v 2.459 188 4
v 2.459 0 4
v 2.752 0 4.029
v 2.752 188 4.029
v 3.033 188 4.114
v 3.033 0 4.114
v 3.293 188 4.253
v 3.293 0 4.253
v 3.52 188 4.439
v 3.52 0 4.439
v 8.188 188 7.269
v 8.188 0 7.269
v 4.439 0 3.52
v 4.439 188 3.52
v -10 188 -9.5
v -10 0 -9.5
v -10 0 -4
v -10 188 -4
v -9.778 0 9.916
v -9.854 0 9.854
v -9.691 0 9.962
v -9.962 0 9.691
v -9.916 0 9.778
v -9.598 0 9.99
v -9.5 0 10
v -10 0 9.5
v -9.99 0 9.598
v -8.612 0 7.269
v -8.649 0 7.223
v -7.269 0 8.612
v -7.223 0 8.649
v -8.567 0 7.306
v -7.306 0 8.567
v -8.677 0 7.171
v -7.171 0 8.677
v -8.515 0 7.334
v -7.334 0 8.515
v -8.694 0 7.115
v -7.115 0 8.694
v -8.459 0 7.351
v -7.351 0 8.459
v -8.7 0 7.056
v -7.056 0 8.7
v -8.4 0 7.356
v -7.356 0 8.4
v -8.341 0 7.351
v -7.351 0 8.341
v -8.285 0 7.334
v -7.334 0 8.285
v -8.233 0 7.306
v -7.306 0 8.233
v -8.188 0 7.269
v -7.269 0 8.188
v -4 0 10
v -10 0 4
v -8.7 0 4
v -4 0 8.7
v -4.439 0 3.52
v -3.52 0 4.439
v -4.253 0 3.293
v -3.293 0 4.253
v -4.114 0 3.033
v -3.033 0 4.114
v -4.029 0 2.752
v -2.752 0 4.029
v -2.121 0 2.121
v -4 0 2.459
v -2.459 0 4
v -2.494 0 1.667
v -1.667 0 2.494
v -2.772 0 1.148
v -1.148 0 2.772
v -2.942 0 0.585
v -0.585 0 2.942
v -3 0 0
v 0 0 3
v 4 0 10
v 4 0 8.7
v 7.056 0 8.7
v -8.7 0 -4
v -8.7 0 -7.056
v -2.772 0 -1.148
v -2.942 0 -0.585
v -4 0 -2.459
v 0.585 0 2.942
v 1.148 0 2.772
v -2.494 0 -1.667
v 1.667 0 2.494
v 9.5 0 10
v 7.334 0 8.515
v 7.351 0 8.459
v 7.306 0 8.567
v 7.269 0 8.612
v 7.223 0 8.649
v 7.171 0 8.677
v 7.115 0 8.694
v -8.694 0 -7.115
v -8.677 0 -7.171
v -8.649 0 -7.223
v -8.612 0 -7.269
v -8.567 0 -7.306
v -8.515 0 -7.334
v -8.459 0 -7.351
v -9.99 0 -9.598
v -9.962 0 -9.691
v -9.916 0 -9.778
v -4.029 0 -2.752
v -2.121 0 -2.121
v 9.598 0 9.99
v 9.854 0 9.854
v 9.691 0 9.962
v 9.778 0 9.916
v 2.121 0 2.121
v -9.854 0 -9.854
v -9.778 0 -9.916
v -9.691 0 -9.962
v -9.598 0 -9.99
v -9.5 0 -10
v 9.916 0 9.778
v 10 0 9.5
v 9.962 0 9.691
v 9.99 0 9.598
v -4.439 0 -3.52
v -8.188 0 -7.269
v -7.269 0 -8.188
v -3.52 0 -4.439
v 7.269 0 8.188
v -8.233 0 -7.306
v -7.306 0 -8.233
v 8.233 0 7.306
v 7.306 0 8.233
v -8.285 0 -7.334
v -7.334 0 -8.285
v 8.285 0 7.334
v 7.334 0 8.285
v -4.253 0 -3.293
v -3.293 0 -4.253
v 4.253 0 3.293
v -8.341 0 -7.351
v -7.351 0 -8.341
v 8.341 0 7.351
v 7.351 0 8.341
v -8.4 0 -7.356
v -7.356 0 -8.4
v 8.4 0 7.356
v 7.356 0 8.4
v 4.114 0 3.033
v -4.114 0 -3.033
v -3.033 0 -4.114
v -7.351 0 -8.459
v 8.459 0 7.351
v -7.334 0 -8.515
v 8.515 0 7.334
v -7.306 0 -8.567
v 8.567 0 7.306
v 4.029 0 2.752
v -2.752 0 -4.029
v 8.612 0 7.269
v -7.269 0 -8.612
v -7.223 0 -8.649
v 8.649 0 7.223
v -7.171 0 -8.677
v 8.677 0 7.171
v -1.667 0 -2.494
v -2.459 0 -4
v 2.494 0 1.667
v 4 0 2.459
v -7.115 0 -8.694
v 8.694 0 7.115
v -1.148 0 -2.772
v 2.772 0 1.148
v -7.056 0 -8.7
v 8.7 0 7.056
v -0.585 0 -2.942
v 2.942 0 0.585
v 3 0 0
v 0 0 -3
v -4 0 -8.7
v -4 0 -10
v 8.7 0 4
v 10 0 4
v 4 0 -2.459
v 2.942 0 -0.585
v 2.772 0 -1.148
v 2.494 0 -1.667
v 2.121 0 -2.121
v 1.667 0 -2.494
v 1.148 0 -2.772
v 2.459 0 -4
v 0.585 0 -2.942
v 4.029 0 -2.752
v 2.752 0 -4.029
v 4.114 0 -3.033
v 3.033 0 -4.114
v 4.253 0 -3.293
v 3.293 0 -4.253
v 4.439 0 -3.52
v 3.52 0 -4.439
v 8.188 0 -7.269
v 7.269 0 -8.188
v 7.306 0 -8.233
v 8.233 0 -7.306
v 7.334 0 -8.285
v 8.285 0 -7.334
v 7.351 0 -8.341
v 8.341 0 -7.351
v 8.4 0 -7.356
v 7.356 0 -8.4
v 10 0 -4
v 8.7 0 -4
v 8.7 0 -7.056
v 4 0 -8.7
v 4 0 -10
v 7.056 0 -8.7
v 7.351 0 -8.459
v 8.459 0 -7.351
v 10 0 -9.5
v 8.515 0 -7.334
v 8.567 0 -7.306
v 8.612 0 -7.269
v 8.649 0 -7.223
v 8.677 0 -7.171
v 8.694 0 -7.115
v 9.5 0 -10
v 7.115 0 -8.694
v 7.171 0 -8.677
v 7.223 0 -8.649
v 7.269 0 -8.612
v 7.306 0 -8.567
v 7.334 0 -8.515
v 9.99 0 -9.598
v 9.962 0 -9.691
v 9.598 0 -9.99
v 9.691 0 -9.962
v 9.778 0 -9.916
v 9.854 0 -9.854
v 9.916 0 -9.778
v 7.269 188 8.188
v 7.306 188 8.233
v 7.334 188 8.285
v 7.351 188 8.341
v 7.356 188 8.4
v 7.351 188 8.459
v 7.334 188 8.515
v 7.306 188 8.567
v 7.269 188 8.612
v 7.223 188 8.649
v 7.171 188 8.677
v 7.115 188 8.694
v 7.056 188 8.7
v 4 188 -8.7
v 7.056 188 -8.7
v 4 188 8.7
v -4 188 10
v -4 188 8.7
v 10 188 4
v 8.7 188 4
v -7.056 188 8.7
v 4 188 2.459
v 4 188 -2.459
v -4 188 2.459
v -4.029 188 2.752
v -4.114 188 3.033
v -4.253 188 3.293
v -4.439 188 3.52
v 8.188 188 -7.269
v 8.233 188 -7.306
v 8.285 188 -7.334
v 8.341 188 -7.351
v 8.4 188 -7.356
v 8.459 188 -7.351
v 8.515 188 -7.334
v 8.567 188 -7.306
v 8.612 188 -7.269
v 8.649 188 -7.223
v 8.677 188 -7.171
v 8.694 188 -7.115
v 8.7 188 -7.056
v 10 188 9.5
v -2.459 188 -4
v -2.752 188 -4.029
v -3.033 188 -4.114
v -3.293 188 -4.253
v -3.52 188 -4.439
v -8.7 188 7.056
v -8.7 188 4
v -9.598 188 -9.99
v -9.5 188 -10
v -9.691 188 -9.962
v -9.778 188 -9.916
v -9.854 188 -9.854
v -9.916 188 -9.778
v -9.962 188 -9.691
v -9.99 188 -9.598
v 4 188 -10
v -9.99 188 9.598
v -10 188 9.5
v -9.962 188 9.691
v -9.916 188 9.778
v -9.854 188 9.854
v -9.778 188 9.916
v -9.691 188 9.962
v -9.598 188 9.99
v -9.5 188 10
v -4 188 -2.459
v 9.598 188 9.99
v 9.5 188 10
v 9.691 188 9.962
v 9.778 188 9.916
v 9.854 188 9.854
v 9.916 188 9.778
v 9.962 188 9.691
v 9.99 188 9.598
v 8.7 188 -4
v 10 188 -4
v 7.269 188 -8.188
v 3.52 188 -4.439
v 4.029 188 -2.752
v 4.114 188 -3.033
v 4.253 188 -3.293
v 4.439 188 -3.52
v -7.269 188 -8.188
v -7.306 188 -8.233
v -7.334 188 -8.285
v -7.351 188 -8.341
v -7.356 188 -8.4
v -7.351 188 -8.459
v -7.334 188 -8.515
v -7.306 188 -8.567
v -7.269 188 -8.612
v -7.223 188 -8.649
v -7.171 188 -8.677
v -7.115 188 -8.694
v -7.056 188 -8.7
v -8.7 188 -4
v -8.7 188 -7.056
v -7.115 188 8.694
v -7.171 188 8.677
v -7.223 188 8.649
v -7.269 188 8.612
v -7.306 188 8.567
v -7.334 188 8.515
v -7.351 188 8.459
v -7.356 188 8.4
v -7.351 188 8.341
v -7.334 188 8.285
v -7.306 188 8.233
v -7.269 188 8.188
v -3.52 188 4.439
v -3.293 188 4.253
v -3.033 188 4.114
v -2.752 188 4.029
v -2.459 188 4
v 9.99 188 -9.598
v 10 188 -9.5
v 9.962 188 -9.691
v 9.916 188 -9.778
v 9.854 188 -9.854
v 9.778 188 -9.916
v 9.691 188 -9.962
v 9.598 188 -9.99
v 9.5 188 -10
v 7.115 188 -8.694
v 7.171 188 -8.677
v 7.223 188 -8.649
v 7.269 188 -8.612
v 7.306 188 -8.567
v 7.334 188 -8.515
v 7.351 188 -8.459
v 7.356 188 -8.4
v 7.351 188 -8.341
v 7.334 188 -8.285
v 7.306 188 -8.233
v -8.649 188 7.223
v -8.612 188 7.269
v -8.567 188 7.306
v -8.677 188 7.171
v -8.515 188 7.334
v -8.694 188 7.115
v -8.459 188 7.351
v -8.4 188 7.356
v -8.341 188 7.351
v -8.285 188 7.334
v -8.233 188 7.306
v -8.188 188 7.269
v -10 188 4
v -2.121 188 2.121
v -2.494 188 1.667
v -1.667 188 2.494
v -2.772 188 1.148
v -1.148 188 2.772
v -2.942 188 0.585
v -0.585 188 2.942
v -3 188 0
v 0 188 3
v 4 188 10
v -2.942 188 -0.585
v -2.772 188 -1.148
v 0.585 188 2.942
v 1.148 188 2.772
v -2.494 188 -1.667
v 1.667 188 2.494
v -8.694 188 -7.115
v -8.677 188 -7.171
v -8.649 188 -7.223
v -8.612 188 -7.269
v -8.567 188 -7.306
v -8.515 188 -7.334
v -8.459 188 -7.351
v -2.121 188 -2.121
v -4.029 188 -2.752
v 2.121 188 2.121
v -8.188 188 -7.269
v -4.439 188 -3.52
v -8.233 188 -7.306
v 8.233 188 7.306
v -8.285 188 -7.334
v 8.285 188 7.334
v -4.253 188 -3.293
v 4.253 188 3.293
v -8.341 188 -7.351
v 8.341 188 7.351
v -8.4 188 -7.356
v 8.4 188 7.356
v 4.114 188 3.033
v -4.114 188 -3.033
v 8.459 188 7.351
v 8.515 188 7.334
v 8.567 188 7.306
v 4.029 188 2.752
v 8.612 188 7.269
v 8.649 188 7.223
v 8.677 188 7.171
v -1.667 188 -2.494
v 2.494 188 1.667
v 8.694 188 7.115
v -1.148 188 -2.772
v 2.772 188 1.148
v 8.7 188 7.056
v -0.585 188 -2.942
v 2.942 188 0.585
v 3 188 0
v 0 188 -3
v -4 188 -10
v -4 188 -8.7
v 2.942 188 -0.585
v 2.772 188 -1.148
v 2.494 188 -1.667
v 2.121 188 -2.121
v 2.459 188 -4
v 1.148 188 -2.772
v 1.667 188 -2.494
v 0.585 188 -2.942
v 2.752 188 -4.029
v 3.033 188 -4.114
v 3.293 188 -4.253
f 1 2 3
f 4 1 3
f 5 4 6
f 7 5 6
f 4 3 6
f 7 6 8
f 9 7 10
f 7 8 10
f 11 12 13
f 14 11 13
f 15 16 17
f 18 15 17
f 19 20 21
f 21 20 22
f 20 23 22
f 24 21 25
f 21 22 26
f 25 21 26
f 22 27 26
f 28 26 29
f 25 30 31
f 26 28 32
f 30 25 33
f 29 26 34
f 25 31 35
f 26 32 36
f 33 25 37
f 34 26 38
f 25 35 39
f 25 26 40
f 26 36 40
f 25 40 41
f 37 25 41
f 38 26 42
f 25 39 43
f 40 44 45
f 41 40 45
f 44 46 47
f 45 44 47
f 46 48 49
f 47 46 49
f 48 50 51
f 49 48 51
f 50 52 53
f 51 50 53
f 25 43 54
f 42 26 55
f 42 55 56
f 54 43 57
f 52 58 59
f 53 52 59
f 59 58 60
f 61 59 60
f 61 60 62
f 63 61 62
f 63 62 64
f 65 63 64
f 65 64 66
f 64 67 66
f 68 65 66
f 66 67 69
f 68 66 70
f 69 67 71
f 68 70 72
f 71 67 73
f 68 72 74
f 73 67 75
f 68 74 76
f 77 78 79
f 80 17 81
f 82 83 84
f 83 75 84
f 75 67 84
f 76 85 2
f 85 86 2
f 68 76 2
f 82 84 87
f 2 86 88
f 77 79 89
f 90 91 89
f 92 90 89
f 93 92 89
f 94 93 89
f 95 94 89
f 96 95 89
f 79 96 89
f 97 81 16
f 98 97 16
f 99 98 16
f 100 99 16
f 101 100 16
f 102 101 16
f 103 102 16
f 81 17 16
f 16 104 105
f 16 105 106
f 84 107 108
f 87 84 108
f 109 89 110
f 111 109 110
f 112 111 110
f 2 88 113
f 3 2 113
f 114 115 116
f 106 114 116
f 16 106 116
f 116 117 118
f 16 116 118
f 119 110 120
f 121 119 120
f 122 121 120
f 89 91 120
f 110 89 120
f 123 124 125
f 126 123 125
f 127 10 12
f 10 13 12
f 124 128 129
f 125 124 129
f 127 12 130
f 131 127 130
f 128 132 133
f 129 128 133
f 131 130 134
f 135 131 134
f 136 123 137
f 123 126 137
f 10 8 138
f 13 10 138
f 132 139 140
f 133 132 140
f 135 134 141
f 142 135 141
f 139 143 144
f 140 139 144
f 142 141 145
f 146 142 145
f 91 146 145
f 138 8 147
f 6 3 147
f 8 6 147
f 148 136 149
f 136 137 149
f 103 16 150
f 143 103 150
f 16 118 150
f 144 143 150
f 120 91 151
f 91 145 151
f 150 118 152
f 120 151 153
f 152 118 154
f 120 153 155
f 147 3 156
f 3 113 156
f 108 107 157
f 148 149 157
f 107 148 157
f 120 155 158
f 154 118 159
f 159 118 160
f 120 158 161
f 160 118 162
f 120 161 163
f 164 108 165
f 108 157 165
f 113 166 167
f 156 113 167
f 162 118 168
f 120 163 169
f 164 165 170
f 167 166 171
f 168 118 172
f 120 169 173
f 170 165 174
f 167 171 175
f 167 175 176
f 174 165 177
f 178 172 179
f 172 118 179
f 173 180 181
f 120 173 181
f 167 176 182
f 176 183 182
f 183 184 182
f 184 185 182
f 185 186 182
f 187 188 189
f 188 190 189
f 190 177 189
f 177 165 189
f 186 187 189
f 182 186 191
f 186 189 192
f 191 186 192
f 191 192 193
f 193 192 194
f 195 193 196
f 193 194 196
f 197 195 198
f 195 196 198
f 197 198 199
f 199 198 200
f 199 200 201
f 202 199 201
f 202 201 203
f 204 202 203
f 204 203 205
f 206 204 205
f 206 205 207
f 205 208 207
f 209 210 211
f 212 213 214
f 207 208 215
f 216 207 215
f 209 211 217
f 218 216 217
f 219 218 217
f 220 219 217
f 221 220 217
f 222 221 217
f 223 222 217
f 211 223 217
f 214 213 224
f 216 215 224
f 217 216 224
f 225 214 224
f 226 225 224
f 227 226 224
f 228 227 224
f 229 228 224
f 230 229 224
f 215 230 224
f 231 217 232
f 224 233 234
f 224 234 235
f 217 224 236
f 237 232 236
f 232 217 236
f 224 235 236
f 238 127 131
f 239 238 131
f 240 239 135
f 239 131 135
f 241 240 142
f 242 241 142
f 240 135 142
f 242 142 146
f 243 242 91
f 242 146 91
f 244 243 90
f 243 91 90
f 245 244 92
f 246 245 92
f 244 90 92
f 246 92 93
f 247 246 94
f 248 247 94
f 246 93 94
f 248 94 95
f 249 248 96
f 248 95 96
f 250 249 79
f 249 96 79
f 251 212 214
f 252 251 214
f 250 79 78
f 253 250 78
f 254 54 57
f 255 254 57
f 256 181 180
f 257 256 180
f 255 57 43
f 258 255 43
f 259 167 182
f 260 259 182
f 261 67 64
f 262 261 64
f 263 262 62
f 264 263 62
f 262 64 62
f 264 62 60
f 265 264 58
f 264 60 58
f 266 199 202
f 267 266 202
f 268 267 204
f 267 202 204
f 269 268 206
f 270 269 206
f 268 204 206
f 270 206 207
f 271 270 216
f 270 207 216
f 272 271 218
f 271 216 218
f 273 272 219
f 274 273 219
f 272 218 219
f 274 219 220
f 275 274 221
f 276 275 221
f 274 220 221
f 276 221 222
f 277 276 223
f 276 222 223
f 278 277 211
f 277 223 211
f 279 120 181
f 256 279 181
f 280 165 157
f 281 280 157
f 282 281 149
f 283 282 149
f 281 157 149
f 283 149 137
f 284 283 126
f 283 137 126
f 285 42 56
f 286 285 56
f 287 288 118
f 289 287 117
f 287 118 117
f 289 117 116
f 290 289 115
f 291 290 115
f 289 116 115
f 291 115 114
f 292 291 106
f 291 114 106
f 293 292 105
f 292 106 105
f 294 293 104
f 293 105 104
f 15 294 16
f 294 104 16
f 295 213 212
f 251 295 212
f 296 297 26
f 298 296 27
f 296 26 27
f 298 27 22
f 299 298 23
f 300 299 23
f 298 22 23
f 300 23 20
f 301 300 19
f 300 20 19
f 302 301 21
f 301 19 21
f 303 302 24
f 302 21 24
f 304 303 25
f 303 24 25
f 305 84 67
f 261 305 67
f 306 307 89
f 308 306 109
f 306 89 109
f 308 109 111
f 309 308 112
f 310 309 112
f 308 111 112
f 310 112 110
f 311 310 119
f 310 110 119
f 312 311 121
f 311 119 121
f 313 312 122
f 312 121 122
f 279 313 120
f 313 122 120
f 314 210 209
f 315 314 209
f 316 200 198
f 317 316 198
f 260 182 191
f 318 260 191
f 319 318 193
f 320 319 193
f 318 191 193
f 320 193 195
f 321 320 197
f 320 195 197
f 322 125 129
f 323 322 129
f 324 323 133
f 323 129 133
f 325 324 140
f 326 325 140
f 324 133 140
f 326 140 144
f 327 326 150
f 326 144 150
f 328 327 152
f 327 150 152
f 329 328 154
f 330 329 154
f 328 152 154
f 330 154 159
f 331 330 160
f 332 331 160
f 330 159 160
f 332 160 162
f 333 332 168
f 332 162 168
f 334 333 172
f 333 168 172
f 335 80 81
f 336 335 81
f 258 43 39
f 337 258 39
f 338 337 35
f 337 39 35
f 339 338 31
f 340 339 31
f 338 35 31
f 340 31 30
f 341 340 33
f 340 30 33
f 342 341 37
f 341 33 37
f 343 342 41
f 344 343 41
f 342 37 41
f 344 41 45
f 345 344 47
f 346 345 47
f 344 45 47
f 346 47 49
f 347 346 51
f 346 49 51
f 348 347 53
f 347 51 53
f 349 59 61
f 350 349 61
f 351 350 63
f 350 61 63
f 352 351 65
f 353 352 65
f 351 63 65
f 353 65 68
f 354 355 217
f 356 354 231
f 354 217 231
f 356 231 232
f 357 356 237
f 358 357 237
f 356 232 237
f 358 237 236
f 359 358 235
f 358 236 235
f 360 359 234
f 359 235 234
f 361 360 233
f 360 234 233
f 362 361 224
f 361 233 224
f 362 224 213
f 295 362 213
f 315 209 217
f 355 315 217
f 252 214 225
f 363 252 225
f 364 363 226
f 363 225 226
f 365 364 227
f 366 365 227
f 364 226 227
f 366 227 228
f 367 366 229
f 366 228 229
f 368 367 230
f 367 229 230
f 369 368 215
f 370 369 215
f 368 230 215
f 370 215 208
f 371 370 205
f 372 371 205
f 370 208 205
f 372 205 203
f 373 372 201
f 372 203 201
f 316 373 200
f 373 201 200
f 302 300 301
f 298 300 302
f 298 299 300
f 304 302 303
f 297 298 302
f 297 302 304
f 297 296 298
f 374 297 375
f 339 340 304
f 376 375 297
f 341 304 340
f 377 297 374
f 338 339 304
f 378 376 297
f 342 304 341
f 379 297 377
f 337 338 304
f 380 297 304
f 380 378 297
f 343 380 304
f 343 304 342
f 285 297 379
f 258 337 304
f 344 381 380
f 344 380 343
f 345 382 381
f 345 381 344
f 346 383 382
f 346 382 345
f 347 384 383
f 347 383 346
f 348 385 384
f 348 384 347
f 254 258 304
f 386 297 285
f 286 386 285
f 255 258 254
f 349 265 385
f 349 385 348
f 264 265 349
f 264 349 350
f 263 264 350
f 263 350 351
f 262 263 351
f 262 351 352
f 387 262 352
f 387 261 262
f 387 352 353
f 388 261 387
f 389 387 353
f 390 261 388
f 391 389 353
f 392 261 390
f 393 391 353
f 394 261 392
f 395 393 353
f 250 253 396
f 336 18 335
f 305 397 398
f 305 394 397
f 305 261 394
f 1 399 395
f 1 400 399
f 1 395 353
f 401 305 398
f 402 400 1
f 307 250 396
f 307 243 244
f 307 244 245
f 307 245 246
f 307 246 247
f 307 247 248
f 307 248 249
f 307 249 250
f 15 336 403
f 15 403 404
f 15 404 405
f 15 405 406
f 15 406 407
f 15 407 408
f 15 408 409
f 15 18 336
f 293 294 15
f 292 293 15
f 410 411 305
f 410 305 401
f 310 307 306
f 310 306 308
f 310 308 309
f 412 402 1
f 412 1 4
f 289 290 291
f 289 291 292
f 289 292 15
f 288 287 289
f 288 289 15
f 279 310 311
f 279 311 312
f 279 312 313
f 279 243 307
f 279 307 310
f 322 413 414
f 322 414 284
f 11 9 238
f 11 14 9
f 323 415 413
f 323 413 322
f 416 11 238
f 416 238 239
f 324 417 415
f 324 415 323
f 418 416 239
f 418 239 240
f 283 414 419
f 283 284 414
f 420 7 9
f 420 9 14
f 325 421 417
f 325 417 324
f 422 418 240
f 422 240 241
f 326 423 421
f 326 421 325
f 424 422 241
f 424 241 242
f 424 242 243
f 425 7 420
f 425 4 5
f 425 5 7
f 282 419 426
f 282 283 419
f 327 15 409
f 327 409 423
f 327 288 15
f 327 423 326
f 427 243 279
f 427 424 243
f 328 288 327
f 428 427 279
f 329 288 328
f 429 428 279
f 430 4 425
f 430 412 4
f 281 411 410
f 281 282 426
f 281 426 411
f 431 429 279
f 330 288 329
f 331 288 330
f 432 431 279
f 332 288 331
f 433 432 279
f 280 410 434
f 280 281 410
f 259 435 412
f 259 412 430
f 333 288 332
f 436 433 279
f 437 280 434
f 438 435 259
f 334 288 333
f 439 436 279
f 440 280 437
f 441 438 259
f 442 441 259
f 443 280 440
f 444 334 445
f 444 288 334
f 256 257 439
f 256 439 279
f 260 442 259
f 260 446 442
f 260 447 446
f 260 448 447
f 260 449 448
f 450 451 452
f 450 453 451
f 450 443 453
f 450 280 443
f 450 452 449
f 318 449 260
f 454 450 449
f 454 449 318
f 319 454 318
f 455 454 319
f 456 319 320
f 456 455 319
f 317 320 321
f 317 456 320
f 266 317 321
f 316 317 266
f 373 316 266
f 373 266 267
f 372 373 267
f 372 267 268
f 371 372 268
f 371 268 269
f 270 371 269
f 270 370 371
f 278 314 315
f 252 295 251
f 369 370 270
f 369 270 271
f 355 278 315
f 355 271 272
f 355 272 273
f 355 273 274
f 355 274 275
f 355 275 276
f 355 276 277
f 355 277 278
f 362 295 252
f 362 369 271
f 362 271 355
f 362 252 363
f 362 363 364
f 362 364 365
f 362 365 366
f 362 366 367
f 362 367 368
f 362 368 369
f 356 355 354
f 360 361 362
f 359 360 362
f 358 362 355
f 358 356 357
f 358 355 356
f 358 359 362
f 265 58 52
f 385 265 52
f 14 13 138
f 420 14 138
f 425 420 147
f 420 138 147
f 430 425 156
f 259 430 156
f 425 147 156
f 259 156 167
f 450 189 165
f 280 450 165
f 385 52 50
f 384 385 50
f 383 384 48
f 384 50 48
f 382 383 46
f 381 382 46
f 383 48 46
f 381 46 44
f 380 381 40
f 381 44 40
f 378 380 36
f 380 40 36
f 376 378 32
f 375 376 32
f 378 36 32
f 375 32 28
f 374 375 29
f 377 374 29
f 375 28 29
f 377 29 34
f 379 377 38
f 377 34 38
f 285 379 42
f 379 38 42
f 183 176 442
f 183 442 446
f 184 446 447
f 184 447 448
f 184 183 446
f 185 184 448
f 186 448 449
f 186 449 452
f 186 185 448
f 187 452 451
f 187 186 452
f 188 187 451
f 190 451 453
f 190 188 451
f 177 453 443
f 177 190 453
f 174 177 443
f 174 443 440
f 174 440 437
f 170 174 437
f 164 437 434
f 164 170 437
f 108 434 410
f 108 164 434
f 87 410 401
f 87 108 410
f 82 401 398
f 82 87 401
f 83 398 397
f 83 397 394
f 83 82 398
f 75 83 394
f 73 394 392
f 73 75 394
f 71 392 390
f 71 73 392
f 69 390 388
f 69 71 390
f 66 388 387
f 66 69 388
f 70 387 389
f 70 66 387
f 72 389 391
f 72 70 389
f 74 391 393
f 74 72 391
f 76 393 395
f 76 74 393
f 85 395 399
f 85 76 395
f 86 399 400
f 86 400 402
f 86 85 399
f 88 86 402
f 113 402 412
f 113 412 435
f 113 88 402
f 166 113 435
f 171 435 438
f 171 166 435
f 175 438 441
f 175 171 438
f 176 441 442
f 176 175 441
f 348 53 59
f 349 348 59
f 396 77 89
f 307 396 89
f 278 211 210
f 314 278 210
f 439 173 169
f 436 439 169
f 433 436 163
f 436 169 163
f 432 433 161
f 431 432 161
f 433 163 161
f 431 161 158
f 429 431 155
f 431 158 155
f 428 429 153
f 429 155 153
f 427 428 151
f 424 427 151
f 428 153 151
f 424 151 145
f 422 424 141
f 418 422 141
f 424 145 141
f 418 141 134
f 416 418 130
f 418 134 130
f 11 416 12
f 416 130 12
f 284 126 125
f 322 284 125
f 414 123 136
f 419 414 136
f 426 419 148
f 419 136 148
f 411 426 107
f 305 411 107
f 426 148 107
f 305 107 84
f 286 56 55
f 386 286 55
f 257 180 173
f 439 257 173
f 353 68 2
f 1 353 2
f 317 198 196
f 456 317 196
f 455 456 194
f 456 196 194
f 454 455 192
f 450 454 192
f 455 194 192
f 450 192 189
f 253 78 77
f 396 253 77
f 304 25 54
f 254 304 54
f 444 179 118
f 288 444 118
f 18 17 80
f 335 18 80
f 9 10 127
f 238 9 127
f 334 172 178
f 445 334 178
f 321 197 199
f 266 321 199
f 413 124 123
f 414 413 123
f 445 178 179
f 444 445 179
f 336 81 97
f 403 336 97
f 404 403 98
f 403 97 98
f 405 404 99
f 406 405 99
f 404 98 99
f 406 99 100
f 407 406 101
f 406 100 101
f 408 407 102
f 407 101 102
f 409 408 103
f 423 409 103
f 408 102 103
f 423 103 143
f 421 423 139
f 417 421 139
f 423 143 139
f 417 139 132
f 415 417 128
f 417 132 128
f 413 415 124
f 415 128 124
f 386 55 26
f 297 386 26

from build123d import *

# Parameters (mm, degrees)
ESBO_O1_R                = 3
RESSALTO_EXTRUS_O1_DEPTH = 188


with BuildPart() as part:
    # Esboço1 → Ressalto-extrusão1 (new body)
    with BuildSketch(Plane(origin=(0, 0, 0), x_dir=(1, 0, 0), z_dir=(0, 1, 0))):
        with BuildLine():
            Line((-7.056497116, 8.7), (-4, 8.7))
            Line((-4, 8.7), (-4, 10))
            Line((-4, 10), (-9.5, 10))
            ThreePointArc((-9.5, 10), (-9.853553391, 9.853553391), (-10, 9.5))
            Line((-10, 9.5), (-10, 4))
            Line((-10, 4), (-8.7, 4))
            Line((-8.7, 4), (-8.7, 7.056497116))
            ThreePointArc((-8.7, 7.056497116), (-8.51480503, 7.333660975), (-8.187867966, 7.26862915))
            Line((-8.187867966, 7.26862915), (-4.439339828, 3.520101013))
            ThreePointArc((-4.439339828, 3.520101013), (-4.114180701, 3.033465989), (-4, 2.459440841))
            Line((-4, 2.459440841), (-4, -2.459440841))
            ThreePointArc((-4, -2.459440841), (-4.114180701, -3.033465989), (-4.439339828, -3.520101013))
            Line((-4.439339828, -3.520101013), (-8.187867966, -7.26862915))
            ThreePointArc((-8.187867966, -7.26862915), (-8.51480503, -7.333660975), (-8.7, -7.056497116))
            Line((-8.7, -7.056497116), (-8.7, -4))
            Line((-8.7, -4), (-10, -4))
            Line((-10, -4), (-10, -9.5))
            ThreePointArc((-10, -9.5), (-9.853553391, -9.853553391), (-9.5, -10))
            Line((-9.5, -10), (-4, -10))
            Line((-4, -10), (-4, -8.7))
            Line((-4, -8.7), (-7.056497116, -8.7))
            ThreePointArc((-7.056497116, -8.7), (-7.333660975, -8.51480503), (-7.26862915, -8.187867966))
            Line((-7.26862915, -8.187867966), (-3.520101013, -4.439339828))
            ThreePointArc((-3.520101013, -4.439339828), (-3.033465989, -4.114180701), (-2.459440841, -4))
            Line((-2.459440841, -4), (2.459440841, -4))
            ThreePointArc((2.459440841, -4), (3.033465989, -4.114180701), (3.520101013, -4.439339828))
            Line((3.520101013, -4.439339828), (7.26862915, -8.187867966))
            ThreePointArc((7.26862915, -8.187867966), (7.333660975, -8.51480503), (7.056497116, -8.7))
            Line((7.056497116, -8.7), (4, -8.7))
            Line((4, -8.7), (4, -10))
            Line((4, -10), (9.5, -10))
            ThreePointArc((9.5, -10), (9.853553391, -9.853553391), (10, -9.5))
            Line((10, -9.5), (10, -4))
            Line((10, -4), (8.7, -4))
            Line((8.7, -4), (8.7, -7.056497116))
            ThreePointArc((8.7, -7.056497116), (8.51480503, -7.333660975), (8.187867966, -7.26862915))
            Line((8.187867966, -7.26862915), (4.439339828, -3.520101013))
            ThreePointArc((4.439339828, -3.520101013), (4.114180701, -3.033465989), (4, -2.459440841))
            Line((4, -2.459440841), (4, 2.459440841))
            ThreePointArc((4, 2.459440841), (4.114180701, 3.033465989), (4.439339828, 3.520101013))
            Line((4.439339828, 3.520101013), (8.187867966, 7.26862915))
            ThreePointArc((8.187867966, 7.26862915), (8.51480503, 7.333660975), (8.7, 7.056497116))
            Line((8.7, 7.056497116), (8.7, 4))
            Line((8.7, 4), (10, 4))
            Line((10, 4), (10, 9.5))
            ThreePointArc((10, 9.5), (9.853553391, 9.853553391), (9.5, 10))
            Line((9.5, 10), (4, 10))
            Line((4, 10), (4, 8.7))
            Line((4, 8.7), (7.056497116, 8.7))
            ThreePointArc((7.056497116, 8.7), (7.333660975, 8.51480503), (7.26862915, 8.187867966))
            Line((7.26862915, 8.187867966), (3.520101013, 4.439339828))
            ThreePointArc((3.520101013, 4.439339828), (3.033465989, 4.114180701), (2.459440841, 4))
            Line((2.459440841, 4), (-2.459440841, 4))
            ThreePointArc((-2.459440841, 4), (-3.033465989, 4.114180701), (-3.520101013, 4.439339828))
            Line((-3.520101013, 4.439339828), (-7.26862915, 8.187867966))
            ThreePointArc((-7.26862915, 8.187867966), (-7.333660975, 8.51480503), (-7.056497116, 8.7))
        make_face()
        Circle(ESBO_O1_R, mode=Mode.SUBTRACT)
    extrude(amount=RESSALTO_EXTRUS_O1_DEPTH)


solid = part.part
